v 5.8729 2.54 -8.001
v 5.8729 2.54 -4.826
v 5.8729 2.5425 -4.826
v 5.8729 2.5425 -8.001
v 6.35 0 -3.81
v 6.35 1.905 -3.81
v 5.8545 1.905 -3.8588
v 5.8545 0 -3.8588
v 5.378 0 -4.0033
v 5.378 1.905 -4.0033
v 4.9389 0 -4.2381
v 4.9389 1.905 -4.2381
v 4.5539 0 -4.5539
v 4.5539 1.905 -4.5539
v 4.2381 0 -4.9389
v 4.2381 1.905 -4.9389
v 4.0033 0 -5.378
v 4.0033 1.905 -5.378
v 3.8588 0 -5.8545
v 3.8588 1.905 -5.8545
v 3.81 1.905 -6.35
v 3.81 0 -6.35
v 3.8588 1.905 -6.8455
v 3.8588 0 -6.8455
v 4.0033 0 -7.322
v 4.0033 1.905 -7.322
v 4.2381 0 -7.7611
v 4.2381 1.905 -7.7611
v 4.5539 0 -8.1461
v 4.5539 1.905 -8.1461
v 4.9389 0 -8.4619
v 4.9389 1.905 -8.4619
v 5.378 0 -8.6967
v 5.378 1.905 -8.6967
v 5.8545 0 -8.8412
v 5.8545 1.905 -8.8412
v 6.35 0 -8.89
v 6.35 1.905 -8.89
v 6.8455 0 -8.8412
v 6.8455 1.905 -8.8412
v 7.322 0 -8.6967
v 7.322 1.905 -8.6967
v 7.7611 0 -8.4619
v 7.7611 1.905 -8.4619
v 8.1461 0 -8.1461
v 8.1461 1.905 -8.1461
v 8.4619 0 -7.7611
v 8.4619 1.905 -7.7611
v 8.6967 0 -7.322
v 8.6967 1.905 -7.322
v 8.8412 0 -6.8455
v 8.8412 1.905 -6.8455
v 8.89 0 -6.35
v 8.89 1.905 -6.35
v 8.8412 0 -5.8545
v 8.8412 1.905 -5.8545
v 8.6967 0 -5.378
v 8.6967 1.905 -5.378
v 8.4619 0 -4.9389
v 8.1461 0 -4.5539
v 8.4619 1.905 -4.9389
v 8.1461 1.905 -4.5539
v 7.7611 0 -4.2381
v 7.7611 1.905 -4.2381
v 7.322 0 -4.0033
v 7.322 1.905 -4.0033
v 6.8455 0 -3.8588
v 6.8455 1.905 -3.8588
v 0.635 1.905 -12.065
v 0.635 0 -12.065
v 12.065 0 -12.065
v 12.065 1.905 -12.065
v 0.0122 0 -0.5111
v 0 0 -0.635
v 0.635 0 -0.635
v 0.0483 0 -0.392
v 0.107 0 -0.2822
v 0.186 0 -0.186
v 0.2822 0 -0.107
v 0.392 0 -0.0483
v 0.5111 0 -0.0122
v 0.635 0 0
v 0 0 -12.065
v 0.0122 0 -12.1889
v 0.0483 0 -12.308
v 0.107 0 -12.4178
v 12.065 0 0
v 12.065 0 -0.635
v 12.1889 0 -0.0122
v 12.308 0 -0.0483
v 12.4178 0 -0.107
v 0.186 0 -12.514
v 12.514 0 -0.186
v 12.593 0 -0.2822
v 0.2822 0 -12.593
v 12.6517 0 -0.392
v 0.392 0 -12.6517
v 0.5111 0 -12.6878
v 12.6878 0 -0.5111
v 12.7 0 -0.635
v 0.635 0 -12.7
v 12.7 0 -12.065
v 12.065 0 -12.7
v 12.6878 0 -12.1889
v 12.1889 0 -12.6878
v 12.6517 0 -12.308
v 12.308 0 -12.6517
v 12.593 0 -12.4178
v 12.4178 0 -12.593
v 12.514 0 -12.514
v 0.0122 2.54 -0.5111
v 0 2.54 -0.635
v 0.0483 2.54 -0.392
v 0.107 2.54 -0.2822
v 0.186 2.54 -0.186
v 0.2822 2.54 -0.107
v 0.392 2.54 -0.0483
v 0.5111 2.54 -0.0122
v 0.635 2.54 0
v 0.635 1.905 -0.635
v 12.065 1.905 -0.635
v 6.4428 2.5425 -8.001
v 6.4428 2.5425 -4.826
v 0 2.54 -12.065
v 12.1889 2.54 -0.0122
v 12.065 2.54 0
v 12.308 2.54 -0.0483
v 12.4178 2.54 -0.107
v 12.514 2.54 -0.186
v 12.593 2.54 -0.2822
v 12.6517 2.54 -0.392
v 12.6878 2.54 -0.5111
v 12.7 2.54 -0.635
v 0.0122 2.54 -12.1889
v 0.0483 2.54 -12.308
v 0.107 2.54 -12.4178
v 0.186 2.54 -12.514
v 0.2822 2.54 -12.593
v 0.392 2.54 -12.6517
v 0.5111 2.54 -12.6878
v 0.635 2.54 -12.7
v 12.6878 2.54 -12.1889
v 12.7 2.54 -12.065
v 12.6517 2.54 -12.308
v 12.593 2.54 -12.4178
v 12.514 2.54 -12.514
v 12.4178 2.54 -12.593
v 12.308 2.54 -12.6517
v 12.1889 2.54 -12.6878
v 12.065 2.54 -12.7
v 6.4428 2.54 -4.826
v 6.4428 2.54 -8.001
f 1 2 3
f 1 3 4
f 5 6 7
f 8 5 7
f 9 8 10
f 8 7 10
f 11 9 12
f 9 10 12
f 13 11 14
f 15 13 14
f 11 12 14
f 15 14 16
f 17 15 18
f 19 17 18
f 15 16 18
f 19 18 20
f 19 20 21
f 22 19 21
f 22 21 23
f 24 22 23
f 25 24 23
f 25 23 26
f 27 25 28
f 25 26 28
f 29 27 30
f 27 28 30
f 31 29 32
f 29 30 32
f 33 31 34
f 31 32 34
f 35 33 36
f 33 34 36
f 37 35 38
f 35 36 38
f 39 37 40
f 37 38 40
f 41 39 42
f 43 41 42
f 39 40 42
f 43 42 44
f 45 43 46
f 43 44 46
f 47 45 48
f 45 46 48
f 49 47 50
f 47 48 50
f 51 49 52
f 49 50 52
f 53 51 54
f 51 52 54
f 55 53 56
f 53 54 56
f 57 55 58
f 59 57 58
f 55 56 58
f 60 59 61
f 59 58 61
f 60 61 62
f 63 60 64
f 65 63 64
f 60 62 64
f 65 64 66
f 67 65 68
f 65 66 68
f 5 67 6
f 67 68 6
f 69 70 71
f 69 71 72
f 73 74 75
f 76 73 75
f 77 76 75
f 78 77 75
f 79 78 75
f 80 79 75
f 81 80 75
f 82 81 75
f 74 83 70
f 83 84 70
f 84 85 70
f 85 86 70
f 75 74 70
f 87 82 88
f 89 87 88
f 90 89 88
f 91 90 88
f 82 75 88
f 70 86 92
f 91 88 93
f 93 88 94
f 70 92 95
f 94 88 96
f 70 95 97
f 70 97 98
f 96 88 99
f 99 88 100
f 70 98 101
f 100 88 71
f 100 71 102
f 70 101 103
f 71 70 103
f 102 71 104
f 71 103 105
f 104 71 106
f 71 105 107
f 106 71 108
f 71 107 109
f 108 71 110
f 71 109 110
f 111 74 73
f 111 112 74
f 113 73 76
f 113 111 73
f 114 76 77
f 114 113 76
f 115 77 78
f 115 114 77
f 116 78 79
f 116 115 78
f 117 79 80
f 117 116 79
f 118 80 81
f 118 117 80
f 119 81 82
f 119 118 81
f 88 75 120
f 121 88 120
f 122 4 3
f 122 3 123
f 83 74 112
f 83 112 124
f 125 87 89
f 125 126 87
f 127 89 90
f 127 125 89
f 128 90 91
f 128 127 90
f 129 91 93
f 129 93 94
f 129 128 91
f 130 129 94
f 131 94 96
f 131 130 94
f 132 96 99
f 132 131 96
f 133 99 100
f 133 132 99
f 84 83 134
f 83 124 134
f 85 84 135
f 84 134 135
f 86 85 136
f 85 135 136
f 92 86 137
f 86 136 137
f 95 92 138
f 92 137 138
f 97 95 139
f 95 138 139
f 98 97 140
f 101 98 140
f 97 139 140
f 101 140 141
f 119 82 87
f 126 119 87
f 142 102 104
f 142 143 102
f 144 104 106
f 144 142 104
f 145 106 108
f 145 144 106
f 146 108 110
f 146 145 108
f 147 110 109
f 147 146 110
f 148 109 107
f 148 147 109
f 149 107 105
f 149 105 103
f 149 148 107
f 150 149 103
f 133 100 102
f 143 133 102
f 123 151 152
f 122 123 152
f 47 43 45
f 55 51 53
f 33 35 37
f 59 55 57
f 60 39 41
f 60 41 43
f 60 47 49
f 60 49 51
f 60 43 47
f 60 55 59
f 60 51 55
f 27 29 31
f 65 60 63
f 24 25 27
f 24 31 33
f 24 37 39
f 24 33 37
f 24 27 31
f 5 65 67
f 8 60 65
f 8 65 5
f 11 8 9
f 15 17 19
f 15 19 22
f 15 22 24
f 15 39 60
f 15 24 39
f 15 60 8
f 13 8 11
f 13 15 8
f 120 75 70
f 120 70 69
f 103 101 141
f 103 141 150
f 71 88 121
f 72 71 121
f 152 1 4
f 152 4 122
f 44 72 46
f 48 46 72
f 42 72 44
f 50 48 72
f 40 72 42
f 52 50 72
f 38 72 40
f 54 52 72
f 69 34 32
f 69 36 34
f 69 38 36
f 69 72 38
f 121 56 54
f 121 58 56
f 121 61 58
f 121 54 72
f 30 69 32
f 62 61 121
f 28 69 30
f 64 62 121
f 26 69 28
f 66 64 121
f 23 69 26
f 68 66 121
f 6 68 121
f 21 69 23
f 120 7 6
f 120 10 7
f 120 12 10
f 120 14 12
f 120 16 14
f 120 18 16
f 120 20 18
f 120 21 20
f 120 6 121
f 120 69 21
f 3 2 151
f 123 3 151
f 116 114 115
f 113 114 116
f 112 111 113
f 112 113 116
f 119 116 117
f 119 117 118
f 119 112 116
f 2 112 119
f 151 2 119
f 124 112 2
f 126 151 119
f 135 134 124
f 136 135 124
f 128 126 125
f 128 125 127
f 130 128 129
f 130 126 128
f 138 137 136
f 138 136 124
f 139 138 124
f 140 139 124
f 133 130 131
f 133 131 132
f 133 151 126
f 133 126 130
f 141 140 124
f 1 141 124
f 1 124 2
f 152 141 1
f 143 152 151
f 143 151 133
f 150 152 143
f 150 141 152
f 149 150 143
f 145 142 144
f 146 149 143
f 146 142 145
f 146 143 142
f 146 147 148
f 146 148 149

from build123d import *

# Parameters (mm, degrees)
SKETCH1_W           = 12.7
SKETCH1_H           = 12.7
BOSS_EXTRUDE1_DEPTH = 2.54
FILLET1_R           = 0.635
SHELL1_START        = 0.635
SHELL1_OUTLINE_W    = 1.905
SHELL1_OUTLINE_H    = 11.43
SHELL1_DEPTH        = 11.43
SKETCH2_R           = 2.54
BOSS_EXTRUDE2_DEPTH = 1.905
SKETCH3_W           = 0.569871795
SKETCH3_H           = 3.175
BOSS_EXTRUDE3_DEPTH = 0.00254


# Read off the part's stored shape, not the designer's step: Shell1
with BuildPart() as part:
    # Sketch1 → Boss-Extrude1 (new body)
    with BuildSketch(Plane(origin=(0, 0, 0), x_dir=(1, 0, 0), z_dir=(0, 1, 0))):
        with Locations((6.35, 6.35)):
            Rectangle(SKETCH1_W, SKETCH1_H)
    extrude(amount=BOSS_EXTRUDE1_DEPTH)

    # Fillet1
    fillet1_edges = [part.edges().sort_by_distance(p)[0] for p in [
        (0, 1.27, -12.7),
        (12.7, 1.27, -12.7),
        (12.7, 1.27, 0),
        (0, 1.27, 0),
    ]]
    fillet(fillet1_edges, radius=FILLET1_R)

    # Shell1 outline → Shell1 (cut)
    with BuildSketch(Plane.YZ.offset(SHELL1_START)):
        with Locations((0.9525, -6.35)):
            Rectangle(SHELL1_OUTLINE_W, SHELL1_OUTLINE_H)
    extrude(amount=SHELL1_DEPTH, mode=Mode.SUBTRACT)

    # Sketch2 → Boss-Extrude2 (add)
    with BuildSketch(Plane(origin=(0, 1.905, 0), x_dir=(-1, 0, 0), z_dir=(0, -1, 0))):
        with Locations(Location((-6.35, 6.35, 0), (0, 0, 270))):
            Circle(SKETCH2_R)
    extrude(amount=BOSS_EXTRUDE2_DEPTH)

    # Sketch3 → Boss-Extrude3 (add)
    with BuildSketch(Plane(origin=(0, 2.54, 0), x_dir=(1, 0, 0), z_dir=(0, 1, 0))):
        with Locations((6.157871795, 6.4135)):
            Rectangle(SKETCH3_W, SKETCH3_H)
    extrude(amount=BOSS_EXTRUDE3_DEPTH)


solid = part.part
